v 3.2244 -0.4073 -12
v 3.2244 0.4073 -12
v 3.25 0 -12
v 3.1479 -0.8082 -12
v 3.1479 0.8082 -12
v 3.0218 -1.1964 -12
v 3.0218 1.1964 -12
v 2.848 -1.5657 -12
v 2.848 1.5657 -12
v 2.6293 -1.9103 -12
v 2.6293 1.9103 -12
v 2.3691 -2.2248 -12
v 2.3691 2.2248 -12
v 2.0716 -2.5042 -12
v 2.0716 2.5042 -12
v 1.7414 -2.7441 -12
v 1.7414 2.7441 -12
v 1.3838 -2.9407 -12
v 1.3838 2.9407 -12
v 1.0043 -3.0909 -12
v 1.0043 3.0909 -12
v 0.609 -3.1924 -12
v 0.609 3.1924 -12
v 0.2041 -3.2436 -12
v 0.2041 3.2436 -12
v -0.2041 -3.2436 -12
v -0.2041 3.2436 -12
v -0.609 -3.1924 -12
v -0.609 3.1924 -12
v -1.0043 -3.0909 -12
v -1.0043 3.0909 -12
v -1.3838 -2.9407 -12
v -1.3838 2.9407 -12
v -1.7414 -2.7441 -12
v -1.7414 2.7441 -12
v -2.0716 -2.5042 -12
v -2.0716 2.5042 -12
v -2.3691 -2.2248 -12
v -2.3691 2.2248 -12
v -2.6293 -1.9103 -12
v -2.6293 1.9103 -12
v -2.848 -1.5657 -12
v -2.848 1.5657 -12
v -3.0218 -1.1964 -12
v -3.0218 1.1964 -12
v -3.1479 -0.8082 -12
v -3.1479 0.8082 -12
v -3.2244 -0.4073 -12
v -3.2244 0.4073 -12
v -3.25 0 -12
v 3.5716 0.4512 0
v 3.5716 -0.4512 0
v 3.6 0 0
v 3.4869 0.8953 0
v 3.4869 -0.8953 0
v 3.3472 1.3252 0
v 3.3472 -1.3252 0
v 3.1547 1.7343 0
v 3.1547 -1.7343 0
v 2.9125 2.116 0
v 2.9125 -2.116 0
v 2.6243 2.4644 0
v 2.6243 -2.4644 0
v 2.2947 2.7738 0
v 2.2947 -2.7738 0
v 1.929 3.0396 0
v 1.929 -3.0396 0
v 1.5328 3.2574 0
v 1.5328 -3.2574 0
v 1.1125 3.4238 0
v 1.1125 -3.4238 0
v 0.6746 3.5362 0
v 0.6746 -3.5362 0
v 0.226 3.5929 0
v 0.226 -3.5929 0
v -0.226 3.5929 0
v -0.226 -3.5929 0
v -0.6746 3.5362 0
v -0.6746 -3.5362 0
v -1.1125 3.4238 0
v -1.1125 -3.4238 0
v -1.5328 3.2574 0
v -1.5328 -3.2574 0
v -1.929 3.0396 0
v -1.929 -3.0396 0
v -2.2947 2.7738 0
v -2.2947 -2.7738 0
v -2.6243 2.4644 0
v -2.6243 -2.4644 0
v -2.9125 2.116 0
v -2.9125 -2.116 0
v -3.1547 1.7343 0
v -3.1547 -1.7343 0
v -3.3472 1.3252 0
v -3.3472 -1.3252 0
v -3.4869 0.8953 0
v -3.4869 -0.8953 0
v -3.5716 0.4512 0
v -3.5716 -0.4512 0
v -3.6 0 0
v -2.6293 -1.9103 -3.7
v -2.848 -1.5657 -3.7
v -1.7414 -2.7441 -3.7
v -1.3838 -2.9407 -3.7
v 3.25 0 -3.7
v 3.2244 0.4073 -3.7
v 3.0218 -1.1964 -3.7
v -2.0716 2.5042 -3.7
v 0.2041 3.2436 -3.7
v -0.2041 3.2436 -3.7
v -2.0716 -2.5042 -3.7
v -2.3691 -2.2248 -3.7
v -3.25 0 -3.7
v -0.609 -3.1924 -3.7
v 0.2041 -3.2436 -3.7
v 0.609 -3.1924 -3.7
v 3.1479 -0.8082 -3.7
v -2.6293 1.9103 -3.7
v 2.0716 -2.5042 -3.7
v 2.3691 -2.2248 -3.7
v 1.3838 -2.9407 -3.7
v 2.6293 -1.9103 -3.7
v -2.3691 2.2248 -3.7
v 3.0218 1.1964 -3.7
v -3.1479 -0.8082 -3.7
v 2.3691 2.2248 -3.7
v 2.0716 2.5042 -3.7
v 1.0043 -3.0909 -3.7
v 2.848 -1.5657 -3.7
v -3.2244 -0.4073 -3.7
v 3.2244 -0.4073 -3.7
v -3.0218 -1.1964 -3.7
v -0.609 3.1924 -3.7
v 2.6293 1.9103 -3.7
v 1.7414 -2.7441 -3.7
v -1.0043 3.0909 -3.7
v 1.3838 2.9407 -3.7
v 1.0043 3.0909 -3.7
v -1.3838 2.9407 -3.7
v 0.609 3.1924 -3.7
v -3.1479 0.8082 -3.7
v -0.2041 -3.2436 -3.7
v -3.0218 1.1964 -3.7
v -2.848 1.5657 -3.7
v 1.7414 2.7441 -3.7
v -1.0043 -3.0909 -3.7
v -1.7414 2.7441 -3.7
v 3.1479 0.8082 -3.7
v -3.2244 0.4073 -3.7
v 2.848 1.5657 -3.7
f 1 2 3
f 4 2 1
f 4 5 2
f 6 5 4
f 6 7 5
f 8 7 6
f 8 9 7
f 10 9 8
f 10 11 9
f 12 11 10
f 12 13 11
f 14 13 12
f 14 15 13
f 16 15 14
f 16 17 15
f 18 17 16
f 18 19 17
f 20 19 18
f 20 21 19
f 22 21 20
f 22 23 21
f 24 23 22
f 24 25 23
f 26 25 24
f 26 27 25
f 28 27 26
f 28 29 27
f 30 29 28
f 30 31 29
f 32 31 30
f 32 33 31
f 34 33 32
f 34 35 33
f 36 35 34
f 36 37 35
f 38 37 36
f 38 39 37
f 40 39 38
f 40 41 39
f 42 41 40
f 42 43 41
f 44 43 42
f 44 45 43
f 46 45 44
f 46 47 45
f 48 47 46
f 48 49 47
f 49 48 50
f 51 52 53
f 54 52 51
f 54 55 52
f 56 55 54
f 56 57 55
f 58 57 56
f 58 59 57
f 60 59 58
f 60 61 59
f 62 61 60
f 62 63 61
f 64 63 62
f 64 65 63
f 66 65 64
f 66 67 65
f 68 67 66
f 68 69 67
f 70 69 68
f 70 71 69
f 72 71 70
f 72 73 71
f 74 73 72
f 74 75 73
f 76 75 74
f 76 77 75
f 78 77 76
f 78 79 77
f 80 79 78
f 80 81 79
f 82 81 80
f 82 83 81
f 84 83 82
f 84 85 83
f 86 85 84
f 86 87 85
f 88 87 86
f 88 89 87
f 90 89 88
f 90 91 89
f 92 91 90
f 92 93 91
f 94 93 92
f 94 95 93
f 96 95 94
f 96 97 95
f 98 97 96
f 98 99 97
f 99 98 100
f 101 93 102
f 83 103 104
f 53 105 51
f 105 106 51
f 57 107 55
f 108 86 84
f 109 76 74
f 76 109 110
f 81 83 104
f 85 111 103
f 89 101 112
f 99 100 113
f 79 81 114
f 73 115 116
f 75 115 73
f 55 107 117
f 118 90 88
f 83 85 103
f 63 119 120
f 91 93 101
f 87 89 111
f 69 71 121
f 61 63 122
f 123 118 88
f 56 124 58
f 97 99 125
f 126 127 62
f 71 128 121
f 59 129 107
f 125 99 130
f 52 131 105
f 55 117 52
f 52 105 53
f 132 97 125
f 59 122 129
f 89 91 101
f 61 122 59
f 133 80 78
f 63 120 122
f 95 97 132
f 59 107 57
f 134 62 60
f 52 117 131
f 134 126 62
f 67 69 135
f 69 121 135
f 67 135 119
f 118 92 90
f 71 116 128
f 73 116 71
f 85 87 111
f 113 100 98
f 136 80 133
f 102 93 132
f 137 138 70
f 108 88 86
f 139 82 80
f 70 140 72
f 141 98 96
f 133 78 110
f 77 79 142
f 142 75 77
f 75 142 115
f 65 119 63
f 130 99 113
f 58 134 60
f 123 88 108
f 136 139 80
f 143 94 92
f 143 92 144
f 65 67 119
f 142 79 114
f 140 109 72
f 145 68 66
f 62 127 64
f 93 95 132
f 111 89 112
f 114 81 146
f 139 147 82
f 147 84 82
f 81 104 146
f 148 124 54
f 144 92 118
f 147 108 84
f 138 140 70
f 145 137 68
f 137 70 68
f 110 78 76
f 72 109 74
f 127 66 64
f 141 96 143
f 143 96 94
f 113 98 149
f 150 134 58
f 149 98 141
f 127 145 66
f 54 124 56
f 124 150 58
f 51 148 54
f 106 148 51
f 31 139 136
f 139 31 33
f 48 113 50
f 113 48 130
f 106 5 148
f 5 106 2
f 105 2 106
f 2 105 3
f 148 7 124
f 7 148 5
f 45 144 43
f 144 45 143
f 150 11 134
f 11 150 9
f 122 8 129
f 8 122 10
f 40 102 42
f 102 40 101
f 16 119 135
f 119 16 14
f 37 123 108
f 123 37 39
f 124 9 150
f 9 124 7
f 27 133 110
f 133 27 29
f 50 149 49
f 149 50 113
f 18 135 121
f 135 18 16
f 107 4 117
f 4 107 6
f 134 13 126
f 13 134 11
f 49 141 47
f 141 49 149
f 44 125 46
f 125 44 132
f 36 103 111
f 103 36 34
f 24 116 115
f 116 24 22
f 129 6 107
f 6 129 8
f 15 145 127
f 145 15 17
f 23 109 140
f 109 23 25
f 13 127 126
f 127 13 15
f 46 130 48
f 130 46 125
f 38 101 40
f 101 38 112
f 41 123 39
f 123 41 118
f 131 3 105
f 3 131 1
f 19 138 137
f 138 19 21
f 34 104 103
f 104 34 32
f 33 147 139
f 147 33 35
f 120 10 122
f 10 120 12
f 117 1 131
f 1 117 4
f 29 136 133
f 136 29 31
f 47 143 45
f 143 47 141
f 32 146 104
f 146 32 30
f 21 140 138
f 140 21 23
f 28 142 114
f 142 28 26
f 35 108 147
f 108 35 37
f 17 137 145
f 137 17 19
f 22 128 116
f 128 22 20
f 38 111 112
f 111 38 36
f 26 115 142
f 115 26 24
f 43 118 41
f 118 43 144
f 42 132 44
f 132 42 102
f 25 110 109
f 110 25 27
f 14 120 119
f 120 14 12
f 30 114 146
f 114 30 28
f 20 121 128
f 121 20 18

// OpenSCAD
$fn = 50;


difference() {
	union() {
		translate(v = [0, 0, 0]) {
			rotate(a = [0, 0, 0]) {
				difference() {
					union() {
						translate(v = [0, 0, -12.0000000000]) {
							cylinder(h = 12, r = 3.0000000000);
						}
						translate(v = [0, 0, -3.7000000000]) {
							cylinder(h = 3.7000000000, r1 = 3.2500000000, r2 = 3.6000000000);
						}
						translate(v = [0, 0, -12.0000000000]) {
							cylinder(h = 12, r = 3.2500000000);
						}
						translate(v = [0, 0, -12.0000000000]) {
							cylinder(h = 12, r = 3.0000000000);
						}
					}
					union();
				}
			}
		}
	}
	union();
}
